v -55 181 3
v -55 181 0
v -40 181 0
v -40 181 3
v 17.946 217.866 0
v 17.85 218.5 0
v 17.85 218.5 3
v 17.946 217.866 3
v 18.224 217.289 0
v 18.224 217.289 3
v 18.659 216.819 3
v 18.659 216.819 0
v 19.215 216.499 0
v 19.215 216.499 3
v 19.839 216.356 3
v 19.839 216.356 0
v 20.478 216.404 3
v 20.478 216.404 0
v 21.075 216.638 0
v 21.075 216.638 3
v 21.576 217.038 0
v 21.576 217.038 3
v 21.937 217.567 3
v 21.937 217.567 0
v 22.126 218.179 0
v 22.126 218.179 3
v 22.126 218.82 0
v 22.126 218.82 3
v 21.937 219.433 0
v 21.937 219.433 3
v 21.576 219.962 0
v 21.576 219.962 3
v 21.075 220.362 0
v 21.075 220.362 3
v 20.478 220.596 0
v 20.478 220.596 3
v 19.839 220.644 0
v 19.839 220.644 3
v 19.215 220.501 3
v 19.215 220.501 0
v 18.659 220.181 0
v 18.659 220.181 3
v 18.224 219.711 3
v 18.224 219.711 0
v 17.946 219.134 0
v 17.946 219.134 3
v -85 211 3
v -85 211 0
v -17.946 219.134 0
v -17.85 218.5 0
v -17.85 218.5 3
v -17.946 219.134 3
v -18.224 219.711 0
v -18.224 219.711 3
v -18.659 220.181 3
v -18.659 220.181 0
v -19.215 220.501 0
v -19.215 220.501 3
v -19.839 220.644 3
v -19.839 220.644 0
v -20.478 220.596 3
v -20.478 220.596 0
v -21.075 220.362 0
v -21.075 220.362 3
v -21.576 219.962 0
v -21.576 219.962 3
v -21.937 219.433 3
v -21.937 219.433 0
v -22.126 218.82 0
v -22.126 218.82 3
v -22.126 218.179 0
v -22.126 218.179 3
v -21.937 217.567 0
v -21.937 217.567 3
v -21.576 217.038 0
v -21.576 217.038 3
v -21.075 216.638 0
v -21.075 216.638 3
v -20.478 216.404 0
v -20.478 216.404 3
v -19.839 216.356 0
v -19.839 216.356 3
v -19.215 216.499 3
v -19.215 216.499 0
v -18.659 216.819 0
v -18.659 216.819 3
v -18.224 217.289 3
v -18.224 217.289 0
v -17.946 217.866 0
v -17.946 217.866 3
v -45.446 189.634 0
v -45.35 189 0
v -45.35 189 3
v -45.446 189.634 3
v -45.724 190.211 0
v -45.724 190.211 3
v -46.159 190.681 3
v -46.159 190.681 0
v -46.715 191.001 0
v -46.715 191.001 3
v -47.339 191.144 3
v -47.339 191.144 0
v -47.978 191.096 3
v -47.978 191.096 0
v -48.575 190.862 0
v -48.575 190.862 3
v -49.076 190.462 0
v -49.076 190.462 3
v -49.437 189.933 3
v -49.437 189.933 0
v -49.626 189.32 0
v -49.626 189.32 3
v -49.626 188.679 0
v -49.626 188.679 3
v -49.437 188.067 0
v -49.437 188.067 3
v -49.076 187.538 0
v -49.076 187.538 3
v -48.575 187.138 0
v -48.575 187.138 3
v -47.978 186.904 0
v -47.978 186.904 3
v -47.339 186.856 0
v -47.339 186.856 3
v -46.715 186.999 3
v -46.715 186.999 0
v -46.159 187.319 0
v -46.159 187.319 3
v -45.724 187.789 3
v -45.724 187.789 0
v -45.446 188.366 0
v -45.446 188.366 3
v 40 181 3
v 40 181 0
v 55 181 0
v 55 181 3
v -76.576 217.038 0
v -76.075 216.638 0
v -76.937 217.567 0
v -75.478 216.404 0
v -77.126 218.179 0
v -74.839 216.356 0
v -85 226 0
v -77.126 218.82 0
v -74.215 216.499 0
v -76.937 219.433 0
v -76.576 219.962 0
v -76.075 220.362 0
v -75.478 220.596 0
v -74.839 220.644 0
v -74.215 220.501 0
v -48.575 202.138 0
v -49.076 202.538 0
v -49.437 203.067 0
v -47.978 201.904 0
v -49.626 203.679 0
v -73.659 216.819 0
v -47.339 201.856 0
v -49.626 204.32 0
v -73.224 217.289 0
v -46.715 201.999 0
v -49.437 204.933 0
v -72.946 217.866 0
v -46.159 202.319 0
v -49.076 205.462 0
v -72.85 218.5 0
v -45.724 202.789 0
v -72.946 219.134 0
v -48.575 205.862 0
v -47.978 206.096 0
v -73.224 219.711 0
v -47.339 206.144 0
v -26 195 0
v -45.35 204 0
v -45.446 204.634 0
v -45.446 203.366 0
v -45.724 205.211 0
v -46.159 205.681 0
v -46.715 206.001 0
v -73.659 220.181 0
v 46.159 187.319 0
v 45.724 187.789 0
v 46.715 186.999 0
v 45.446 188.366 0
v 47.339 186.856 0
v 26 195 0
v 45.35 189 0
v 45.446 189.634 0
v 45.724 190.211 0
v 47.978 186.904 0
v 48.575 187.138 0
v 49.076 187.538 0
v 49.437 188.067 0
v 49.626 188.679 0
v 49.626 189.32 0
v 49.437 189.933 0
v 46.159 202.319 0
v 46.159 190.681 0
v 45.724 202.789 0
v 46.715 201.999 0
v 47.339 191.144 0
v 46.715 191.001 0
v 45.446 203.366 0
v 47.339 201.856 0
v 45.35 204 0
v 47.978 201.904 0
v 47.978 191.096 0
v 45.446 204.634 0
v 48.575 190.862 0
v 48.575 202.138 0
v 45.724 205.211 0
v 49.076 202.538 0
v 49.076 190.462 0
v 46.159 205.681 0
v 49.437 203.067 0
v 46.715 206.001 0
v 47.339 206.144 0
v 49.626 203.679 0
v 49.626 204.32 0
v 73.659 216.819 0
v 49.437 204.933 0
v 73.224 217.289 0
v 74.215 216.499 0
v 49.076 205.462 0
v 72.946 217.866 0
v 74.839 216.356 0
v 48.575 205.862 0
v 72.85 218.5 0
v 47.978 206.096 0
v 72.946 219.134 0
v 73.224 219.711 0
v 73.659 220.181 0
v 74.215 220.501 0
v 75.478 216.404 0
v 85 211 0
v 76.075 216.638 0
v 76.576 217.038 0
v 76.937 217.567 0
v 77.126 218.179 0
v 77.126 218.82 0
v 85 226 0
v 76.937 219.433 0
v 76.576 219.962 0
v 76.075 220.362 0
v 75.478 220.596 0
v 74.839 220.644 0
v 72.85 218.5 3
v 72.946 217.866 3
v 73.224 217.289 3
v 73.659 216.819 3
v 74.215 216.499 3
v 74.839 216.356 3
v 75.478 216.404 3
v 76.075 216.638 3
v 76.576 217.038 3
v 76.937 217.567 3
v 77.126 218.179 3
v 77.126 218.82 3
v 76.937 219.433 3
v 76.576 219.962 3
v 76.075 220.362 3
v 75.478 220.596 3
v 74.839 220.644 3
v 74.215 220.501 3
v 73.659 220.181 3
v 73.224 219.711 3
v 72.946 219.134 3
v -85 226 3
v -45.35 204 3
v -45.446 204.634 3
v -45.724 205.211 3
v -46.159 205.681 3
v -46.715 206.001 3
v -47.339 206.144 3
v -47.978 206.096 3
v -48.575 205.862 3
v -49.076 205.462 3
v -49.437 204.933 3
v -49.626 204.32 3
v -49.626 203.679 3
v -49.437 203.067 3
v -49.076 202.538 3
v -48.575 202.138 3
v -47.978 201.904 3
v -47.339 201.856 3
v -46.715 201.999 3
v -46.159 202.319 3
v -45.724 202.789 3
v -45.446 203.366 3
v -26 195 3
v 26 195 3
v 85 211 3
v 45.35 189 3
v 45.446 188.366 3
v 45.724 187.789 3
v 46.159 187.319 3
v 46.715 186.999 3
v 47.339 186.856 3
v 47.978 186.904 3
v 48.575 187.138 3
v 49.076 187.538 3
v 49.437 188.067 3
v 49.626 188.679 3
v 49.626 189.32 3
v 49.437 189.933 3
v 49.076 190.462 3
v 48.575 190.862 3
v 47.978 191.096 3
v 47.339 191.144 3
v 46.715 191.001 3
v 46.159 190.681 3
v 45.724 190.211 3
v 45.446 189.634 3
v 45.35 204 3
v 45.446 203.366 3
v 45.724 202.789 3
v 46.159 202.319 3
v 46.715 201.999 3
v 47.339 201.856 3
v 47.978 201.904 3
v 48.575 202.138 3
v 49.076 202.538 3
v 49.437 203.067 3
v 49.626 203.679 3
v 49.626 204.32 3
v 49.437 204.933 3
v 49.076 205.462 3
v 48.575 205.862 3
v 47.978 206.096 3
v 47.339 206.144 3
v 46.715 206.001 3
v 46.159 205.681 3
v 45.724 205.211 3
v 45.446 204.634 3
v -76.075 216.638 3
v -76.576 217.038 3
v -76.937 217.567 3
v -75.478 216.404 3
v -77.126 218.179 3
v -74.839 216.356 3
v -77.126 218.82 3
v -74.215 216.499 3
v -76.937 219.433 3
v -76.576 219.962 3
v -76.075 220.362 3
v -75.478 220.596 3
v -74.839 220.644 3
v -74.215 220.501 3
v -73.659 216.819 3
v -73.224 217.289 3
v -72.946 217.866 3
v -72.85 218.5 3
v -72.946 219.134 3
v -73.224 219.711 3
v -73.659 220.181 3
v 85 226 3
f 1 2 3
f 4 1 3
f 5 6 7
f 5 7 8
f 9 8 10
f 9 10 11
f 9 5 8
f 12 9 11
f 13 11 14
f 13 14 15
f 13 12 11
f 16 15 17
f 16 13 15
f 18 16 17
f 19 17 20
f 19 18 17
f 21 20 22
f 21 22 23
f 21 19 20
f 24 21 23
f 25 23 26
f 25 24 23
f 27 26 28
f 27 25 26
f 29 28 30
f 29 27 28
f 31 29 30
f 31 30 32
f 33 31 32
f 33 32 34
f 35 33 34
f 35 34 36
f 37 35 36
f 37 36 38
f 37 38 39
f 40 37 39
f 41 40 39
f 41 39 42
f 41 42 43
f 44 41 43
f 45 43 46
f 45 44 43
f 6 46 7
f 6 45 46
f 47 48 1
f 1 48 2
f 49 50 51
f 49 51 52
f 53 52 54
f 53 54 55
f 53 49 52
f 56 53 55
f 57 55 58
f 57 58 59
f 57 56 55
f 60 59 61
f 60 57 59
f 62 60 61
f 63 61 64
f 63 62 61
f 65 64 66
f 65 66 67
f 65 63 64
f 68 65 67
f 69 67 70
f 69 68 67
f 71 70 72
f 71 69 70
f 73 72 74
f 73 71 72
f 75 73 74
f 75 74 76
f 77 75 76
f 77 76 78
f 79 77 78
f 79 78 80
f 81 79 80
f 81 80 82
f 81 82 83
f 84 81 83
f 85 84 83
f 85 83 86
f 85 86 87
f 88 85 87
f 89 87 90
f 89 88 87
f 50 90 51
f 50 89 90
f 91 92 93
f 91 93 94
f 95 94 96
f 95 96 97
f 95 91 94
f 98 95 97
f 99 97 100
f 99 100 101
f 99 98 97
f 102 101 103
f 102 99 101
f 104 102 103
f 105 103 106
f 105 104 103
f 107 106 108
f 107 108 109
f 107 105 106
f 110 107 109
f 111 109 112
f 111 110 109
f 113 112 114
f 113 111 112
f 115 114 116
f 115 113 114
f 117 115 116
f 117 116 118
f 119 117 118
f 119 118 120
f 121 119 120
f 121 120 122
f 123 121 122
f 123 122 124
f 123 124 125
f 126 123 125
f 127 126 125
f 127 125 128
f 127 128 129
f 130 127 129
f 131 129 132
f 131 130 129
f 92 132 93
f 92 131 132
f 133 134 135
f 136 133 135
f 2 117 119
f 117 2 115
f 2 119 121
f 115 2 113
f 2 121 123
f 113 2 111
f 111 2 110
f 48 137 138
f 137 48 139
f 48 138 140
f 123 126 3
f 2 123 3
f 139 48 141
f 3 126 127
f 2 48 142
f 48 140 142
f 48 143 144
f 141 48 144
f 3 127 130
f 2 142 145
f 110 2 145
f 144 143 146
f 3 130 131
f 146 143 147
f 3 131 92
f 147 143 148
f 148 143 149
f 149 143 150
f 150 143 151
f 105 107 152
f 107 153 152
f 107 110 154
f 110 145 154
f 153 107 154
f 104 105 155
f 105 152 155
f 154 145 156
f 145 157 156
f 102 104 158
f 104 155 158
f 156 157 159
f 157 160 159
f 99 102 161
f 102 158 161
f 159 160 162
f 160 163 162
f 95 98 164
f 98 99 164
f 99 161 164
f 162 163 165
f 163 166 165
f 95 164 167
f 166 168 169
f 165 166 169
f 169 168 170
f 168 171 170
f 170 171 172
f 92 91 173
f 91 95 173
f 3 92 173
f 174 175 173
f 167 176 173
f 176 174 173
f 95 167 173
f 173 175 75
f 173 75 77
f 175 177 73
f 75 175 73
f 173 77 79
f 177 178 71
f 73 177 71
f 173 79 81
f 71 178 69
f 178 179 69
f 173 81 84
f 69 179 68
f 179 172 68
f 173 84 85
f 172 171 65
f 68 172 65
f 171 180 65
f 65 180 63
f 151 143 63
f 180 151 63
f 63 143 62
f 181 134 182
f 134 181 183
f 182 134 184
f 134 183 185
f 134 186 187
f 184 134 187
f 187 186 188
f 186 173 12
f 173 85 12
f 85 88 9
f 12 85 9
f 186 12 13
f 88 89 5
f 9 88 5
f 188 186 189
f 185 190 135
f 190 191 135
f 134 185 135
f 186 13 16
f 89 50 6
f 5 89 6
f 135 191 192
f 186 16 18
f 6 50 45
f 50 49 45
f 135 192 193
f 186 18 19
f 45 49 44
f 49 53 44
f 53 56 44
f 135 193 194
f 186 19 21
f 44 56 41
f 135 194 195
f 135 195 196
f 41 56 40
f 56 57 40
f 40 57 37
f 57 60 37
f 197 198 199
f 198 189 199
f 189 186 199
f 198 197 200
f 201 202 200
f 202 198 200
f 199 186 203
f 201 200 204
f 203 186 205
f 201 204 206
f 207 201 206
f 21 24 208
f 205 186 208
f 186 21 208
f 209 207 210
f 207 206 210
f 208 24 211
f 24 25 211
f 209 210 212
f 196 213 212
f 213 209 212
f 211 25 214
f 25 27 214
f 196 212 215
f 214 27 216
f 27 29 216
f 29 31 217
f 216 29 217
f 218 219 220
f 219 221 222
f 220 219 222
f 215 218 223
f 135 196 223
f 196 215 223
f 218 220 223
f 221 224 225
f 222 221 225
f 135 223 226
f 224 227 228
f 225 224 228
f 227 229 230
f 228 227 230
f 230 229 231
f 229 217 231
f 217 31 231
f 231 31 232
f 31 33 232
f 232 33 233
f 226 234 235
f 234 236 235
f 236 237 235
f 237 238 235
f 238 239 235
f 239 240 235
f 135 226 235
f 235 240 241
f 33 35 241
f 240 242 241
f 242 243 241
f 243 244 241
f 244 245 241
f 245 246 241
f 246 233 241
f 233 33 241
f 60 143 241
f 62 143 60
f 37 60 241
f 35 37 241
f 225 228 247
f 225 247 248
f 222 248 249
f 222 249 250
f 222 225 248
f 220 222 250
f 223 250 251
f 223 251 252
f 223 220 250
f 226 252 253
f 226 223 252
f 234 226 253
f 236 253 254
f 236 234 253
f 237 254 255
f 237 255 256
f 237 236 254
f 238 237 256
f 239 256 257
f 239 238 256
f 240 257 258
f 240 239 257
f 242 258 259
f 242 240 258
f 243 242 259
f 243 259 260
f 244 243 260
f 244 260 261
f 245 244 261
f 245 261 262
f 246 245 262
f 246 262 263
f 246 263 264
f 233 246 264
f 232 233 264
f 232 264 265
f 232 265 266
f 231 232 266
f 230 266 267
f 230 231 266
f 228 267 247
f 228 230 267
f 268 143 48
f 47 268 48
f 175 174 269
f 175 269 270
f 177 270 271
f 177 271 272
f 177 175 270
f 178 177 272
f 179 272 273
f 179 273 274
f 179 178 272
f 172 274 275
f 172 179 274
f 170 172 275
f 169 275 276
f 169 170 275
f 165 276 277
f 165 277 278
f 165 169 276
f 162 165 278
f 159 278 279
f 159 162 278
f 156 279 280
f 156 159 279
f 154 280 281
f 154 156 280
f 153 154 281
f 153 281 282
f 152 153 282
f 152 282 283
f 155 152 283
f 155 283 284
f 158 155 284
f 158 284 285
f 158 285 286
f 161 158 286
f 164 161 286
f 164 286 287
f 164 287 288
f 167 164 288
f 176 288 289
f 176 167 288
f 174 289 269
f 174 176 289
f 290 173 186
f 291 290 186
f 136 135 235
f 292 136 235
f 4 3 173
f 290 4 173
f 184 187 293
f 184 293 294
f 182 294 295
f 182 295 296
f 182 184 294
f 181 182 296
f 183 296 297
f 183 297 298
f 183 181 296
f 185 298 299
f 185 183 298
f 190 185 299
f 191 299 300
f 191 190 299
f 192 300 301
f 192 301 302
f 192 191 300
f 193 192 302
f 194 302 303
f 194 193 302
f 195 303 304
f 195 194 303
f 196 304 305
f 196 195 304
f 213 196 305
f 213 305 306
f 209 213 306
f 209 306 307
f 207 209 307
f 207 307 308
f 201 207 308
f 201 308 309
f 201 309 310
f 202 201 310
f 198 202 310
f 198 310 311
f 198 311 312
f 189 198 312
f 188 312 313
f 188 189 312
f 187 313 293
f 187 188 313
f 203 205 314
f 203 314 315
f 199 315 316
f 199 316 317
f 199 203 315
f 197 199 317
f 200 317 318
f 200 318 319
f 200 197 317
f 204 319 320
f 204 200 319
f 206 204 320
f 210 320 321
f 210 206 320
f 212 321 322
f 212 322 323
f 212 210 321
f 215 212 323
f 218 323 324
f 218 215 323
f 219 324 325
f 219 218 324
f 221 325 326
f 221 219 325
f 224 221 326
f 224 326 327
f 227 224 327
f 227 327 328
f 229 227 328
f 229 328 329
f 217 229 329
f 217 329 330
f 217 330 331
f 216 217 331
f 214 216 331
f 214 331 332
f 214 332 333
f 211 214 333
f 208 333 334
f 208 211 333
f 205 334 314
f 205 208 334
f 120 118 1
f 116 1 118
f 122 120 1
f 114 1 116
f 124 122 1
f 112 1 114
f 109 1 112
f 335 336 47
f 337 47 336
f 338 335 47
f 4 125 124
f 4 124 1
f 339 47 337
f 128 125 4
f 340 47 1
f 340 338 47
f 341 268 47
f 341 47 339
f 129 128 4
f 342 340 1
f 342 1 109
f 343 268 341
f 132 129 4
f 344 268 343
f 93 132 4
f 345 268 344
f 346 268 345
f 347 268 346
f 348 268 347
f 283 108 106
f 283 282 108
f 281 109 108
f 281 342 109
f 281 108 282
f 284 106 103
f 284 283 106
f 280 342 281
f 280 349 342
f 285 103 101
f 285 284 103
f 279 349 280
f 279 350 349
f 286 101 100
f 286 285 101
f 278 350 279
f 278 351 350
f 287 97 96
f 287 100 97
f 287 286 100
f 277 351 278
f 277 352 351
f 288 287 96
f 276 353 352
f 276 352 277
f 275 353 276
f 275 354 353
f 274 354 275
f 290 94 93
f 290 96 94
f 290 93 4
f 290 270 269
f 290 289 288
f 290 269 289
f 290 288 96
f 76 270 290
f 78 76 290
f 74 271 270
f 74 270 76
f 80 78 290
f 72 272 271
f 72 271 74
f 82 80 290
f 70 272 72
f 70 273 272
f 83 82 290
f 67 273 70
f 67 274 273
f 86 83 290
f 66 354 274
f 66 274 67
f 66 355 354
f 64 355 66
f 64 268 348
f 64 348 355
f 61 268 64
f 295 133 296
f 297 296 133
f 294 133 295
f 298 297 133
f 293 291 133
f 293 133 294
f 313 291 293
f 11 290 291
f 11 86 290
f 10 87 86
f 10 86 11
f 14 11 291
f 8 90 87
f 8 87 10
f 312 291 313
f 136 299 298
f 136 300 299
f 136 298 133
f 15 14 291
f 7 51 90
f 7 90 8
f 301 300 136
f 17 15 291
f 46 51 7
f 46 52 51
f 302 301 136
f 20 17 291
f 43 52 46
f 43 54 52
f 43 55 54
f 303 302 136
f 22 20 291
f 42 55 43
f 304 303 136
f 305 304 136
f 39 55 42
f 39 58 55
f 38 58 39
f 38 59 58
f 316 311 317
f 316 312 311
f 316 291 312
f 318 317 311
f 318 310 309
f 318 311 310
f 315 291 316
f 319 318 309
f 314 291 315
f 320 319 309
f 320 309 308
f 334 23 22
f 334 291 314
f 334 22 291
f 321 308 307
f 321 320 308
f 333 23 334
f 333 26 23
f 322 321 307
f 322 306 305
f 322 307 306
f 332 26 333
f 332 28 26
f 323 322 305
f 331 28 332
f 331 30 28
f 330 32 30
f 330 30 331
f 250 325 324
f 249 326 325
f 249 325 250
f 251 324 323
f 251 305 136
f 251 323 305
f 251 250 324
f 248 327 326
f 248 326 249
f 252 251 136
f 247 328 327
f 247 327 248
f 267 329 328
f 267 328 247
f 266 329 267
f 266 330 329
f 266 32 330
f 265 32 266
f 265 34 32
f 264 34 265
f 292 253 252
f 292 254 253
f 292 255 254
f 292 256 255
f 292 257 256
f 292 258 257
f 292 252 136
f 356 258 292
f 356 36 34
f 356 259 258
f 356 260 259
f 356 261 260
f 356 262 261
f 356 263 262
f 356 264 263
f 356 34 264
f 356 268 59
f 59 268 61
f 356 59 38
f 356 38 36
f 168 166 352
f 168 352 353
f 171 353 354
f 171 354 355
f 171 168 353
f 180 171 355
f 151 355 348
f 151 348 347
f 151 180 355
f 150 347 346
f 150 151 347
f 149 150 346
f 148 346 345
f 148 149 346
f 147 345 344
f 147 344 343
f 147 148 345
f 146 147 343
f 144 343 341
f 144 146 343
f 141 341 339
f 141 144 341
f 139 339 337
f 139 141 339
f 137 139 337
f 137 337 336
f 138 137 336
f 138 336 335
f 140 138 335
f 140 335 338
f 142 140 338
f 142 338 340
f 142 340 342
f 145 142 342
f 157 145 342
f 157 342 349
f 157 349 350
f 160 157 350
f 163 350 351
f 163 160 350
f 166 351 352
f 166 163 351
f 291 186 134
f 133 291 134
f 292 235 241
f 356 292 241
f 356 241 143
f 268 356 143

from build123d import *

# Parameters (mm, degrees)
SKETCH1_R      = 2.15
EXTRUDE1_DEPTH = 3


with BuildPart() as part:
    # Sketch1 → Extrude1 (new body)
    with BuildSketch(Plane.XY):
        Polygon((-85, 225.999923245), (-85, 210.999923245), (-55, 180.999923245), (-40, 180.999923245), (-26, 194.999923245), (26, 194.999923245), (40, 180.999923245), (55, 180.999923245), (85, 210.999923245), (85, 225.999923245), align=None)
        with Locations((-47.5, 188.999923245)):
            Circle(SKETCH1_R, mode=Mode.SUBTRACT)
        with Locations((-47.5, 203.999923245)):
            Circle(SKETCH1_R, mode=Mode.SUBTRACT)
        with Locations((-75, 218.499923245)):
            Circle(SKETCH1_R, mode=Mode.SUBTRACT)
        with Locations((-20, 218.499923245)):
            Circle(SKETCH1_R, mode=Mode.SUBTRACT)
        with Locations(Location((47.5, 188.999923245, 0), (0, 0, 180))):
            Circle(SKETCH1_R, mode=Mode.SUBTRACT)
        with Locations(Location((47.5, 203.999923245, 0), (0, 0, 180))):
            Circle(SKETCH1_R, mode=Mode.SUBTRACT)
        with Locations(Location((20, 218.499923245, 0), (0, 0, 180))):
            Circle(SKETCH1_R, mode=Mode.SUBTRACT)
        with Locations(Location((75, 218.499923245, 0), (0, 0, 180))):
            Circle(SKETCH1_R, mode=Mode.SUBTRACT)
    extrude(amount=EXTRUDE1_DEPTH)


solid = part.part
